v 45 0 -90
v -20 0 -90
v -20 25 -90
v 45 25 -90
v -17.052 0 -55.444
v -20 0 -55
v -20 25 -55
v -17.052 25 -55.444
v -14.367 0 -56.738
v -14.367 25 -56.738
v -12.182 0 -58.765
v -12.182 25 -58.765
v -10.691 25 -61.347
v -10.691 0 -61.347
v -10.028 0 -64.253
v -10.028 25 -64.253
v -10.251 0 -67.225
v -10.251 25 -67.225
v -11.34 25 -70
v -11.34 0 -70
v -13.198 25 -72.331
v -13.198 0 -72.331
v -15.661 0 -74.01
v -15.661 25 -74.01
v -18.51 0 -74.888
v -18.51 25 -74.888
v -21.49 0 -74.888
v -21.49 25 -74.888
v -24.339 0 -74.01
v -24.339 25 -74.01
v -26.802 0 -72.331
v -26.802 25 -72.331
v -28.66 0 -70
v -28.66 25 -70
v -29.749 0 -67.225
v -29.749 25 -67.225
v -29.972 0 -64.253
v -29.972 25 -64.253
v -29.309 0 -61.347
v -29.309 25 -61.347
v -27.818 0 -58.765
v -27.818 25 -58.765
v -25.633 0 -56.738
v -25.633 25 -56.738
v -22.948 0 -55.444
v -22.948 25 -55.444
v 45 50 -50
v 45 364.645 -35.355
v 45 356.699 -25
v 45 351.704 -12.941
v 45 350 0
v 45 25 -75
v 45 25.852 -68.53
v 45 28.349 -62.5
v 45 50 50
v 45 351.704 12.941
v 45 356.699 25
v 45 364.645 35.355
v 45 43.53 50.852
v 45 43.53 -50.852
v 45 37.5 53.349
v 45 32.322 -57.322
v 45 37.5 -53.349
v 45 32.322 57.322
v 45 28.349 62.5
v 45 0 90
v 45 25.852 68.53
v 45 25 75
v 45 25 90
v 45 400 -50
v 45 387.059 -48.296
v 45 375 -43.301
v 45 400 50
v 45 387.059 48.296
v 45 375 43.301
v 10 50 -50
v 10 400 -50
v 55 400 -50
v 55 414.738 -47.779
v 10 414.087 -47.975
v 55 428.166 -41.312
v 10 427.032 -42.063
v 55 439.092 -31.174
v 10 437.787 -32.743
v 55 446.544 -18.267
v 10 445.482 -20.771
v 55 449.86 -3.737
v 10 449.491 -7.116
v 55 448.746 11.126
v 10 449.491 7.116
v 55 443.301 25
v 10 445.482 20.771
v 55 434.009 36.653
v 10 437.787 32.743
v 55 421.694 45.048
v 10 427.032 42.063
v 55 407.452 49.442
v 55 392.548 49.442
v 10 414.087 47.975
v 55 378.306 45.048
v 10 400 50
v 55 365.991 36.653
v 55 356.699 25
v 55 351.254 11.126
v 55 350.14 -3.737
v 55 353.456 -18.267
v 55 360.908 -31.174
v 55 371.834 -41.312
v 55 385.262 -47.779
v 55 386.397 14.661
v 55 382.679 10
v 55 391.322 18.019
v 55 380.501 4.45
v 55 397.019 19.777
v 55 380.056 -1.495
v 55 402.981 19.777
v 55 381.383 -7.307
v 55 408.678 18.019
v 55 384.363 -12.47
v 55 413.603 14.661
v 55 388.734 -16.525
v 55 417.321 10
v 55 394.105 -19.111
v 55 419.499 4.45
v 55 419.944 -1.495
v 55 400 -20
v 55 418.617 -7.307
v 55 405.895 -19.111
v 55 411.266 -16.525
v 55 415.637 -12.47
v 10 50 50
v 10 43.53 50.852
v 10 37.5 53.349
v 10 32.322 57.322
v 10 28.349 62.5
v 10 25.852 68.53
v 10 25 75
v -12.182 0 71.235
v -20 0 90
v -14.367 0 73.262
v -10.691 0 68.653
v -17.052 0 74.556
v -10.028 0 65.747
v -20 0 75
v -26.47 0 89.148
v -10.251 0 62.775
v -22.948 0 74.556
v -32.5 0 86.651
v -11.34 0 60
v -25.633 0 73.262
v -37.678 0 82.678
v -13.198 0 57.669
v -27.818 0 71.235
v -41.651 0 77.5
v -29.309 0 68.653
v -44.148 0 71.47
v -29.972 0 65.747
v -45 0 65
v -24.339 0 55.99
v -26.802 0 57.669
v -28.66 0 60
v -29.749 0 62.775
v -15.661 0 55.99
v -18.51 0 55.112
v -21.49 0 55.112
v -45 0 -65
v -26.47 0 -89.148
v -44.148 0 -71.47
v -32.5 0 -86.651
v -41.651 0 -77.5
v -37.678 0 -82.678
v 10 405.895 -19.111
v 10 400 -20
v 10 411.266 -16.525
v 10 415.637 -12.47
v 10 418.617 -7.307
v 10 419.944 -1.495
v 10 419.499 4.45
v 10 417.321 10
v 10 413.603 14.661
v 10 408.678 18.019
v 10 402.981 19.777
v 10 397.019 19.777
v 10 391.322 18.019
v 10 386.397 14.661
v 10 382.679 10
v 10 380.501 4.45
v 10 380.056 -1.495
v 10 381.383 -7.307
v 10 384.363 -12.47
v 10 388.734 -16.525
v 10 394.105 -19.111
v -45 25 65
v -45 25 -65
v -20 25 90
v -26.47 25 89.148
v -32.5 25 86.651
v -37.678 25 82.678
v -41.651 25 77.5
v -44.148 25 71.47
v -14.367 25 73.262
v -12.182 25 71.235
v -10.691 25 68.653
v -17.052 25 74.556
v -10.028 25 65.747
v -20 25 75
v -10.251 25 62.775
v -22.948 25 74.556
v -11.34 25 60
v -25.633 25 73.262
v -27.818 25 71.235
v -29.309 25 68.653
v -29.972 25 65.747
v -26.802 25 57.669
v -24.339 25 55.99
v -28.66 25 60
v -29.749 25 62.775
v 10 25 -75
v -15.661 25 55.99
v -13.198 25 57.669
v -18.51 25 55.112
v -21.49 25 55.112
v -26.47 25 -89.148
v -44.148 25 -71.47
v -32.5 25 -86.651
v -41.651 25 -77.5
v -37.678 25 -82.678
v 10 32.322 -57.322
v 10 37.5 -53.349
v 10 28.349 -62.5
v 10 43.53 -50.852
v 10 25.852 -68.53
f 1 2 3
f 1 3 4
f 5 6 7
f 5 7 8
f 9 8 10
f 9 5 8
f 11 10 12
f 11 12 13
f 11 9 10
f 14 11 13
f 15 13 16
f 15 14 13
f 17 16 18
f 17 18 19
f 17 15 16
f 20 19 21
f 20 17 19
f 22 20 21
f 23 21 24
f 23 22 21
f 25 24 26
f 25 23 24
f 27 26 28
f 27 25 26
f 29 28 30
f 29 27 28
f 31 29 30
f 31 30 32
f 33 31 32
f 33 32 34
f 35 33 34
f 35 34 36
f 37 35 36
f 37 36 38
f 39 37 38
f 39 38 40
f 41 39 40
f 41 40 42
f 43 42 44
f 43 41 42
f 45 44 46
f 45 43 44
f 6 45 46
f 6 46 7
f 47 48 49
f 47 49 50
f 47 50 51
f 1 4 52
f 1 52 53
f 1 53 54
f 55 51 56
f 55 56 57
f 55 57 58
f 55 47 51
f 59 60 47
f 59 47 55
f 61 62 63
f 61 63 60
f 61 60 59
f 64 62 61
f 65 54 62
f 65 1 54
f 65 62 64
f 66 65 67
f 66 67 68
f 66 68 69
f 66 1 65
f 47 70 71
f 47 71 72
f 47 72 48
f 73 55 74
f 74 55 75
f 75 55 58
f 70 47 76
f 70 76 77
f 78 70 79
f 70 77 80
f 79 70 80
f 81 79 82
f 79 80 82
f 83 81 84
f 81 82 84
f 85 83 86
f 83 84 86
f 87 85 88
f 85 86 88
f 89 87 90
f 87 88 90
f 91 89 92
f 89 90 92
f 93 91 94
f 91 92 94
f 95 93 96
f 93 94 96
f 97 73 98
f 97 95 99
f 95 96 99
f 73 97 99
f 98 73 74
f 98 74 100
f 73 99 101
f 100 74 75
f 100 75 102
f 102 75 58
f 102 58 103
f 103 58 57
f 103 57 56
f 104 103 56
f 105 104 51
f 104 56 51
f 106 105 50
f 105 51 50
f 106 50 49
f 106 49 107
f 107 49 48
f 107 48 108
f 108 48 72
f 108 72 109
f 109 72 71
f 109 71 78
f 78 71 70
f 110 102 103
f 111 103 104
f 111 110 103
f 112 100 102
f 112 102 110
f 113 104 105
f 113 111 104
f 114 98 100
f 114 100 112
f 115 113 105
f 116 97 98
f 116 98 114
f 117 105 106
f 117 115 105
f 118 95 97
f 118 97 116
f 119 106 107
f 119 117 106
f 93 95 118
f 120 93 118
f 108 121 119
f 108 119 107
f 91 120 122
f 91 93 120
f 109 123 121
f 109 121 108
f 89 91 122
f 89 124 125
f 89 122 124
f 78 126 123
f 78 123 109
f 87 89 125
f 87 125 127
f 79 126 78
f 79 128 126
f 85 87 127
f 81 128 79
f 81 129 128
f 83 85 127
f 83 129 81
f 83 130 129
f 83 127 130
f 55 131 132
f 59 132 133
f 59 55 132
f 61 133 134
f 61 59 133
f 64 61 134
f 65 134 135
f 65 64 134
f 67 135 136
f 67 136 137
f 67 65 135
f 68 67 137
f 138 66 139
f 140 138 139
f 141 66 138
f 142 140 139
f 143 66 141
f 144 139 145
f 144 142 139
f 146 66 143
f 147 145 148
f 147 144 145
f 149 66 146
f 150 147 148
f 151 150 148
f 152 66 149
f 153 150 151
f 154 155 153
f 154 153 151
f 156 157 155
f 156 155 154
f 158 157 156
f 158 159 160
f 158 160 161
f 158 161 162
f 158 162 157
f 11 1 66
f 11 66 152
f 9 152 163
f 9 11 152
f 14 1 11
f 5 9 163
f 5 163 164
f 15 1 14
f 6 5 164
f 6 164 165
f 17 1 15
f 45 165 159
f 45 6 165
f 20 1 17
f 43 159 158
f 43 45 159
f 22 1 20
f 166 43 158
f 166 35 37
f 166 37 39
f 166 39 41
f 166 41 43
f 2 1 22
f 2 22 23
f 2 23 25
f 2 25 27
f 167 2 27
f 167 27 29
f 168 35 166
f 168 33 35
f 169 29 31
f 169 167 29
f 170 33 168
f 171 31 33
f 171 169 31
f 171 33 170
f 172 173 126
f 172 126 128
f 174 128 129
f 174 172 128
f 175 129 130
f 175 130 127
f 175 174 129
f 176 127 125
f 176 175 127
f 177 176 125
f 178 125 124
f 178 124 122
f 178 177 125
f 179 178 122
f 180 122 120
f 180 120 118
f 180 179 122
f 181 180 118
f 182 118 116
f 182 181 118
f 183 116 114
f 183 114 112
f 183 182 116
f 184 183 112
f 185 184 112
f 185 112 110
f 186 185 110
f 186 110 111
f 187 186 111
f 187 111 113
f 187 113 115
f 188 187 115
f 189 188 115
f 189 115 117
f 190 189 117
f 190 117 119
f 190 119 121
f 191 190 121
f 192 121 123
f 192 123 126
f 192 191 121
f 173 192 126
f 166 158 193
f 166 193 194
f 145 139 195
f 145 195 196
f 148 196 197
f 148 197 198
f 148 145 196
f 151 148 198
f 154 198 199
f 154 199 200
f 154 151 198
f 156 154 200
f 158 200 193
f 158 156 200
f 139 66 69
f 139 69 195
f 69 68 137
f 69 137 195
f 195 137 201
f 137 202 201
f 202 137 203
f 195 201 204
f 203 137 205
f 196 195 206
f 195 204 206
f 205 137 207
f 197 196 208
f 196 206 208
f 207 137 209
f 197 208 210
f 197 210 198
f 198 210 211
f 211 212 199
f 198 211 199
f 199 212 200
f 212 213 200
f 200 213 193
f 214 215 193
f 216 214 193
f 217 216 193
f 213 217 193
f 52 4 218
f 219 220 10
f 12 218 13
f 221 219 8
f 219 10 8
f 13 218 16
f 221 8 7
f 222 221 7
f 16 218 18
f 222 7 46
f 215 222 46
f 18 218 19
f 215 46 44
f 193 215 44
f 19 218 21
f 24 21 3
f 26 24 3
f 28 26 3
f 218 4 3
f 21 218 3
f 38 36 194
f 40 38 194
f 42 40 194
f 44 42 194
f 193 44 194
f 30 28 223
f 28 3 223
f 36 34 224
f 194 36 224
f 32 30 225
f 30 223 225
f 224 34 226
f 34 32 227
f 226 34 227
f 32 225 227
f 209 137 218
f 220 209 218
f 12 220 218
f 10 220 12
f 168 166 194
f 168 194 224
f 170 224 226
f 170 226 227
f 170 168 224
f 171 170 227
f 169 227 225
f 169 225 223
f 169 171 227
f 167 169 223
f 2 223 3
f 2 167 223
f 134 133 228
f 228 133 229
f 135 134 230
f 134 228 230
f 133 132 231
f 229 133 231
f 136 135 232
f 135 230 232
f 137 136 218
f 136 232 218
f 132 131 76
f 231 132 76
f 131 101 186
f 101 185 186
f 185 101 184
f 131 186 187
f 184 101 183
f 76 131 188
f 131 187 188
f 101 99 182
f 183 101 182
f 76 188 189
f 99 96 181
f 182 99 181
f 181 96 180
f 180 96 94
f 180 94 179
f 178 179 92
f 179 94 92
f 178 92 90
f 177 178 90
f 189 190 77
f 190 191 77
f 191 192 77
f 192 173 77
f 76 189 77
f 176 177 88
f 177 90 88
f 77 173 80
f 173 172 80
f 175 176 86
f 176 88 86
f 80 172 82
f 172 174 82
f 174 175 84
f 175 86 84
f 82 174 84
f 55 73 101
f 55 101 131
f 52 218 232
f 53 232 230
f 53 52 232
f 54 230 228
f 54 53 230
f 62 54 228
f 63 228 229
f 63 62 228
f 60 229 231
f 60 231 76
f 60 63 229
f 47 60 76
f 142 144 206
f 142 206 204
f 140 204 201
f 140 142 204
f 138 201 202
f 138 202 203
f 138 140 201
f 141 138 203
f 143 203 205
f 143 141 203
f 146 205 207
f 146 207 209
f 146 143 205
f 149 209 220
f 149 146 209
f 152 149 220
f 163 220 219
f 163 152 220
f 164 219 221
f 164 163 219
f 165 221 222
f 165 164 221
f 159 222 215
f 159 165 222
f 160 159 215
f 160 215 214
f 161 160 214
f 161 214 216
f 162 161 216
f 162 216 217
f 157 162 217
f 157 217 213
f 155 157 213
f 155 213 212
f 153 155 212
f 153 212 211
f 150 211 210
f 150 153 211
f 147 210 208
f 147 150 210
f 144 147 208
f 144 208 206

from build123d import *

# Parameters (mm, degrees)
ESQUISSE1_R        = 10
BOSS_EXTRU_1_DEPTH = 25
BOSS_EXTRU_2_DEPTH = 35
BOSS_EXTRU_3_START = -35
ESQUISSE2_4_R      = 50
ESQUISSE2_4_R_2    = 20
BOSS_EXTRU_3_DEPTH = 45


with BuildPart() as part:
    # Esquisse1 → Boss.-Extru.1 (new body)
    with BuildSketch(Plane(origin=(0, 0, 0), x_dir=(1, 0, 0), z_dir=(0, 1, 0))):
        with BuildLine():
            Line((45, -90), (-20, -90))
            ThreePointArc((-20, -90), (-37.67766953, -82.67766953), (-45, -65))
            Line((-45, -65), (-45, 65))
            ThreePointArc((-45, 65), (-37.67766953, 82.67766953), (-20, 90))
            Line((-20, 90), (45, 90))
            Line((45, 90), (45, -90))
        make_face()
        with Locations(Location((-20, 65, 0), (0, 0, 270))):
            Circle(ESQUISSE1_R, mode=Mode.SUBTRACT)
        with Locations(Location((-20, -65, 0), (0, 0, 270))):
            Circle(ESQUISSE1_R, mode=Mode.SUBTRACT)
    extrude(amount=BOSS_EXTRU_1_DEPTH)

    # Esquisse2 → Boss.-Extru.2 (add)
    with BuildSketch(Plane(origin=(45, 0, 0), x_dir=(0, 0, -1), z_dir=(1, 0, 0))):
        with BuildLine():
            Line((-75, 25), (0, 25))
            Line((0, 25), (0, 350))
            ThreePointArc((0, 350), (-35.355339059, 364.644660941), (-50, 400))
            Line((-50, 400), (-50, 50))
            ThreePointArc((-50, 50), (-57.32233047, 32.32233047), (-75, 25))
        make_face()
        with BuildLine():
            Line((0, 350), (0, 25))
            Line((0, 25), (75, 25))
            ThreePointArc((75, 25), (57.32233047, 32.32233047), (50, 50))
            Line((50, 50), (50, 400))
            ThreePointArc((50, 400), (35.355339059, 364.644660941), (0, 350))
        make_face()
    extrude(amount=-BOSS_EXTRU_2_DEPTH)

    # Esquisse2<4> → Boss.-Extru.3 (add)
    with BuildSketch(Plane(origin=(45, 0, 0), x_dir=(0, 0, -1), z_dir=(1, 0, 0)).offset(BOSS_EXTRU_3_START)):
        with Locations((0, 400)):
            Circle(ESQUISSE2_4_R)
        with Locations((0, 400)):
            Circle(ESQUISSE2_4_R_2, mode=Mode.SUBTRACT)
    extrude(amount=BOSS_EXTRU_3_DEPTH)


solid = part.part
